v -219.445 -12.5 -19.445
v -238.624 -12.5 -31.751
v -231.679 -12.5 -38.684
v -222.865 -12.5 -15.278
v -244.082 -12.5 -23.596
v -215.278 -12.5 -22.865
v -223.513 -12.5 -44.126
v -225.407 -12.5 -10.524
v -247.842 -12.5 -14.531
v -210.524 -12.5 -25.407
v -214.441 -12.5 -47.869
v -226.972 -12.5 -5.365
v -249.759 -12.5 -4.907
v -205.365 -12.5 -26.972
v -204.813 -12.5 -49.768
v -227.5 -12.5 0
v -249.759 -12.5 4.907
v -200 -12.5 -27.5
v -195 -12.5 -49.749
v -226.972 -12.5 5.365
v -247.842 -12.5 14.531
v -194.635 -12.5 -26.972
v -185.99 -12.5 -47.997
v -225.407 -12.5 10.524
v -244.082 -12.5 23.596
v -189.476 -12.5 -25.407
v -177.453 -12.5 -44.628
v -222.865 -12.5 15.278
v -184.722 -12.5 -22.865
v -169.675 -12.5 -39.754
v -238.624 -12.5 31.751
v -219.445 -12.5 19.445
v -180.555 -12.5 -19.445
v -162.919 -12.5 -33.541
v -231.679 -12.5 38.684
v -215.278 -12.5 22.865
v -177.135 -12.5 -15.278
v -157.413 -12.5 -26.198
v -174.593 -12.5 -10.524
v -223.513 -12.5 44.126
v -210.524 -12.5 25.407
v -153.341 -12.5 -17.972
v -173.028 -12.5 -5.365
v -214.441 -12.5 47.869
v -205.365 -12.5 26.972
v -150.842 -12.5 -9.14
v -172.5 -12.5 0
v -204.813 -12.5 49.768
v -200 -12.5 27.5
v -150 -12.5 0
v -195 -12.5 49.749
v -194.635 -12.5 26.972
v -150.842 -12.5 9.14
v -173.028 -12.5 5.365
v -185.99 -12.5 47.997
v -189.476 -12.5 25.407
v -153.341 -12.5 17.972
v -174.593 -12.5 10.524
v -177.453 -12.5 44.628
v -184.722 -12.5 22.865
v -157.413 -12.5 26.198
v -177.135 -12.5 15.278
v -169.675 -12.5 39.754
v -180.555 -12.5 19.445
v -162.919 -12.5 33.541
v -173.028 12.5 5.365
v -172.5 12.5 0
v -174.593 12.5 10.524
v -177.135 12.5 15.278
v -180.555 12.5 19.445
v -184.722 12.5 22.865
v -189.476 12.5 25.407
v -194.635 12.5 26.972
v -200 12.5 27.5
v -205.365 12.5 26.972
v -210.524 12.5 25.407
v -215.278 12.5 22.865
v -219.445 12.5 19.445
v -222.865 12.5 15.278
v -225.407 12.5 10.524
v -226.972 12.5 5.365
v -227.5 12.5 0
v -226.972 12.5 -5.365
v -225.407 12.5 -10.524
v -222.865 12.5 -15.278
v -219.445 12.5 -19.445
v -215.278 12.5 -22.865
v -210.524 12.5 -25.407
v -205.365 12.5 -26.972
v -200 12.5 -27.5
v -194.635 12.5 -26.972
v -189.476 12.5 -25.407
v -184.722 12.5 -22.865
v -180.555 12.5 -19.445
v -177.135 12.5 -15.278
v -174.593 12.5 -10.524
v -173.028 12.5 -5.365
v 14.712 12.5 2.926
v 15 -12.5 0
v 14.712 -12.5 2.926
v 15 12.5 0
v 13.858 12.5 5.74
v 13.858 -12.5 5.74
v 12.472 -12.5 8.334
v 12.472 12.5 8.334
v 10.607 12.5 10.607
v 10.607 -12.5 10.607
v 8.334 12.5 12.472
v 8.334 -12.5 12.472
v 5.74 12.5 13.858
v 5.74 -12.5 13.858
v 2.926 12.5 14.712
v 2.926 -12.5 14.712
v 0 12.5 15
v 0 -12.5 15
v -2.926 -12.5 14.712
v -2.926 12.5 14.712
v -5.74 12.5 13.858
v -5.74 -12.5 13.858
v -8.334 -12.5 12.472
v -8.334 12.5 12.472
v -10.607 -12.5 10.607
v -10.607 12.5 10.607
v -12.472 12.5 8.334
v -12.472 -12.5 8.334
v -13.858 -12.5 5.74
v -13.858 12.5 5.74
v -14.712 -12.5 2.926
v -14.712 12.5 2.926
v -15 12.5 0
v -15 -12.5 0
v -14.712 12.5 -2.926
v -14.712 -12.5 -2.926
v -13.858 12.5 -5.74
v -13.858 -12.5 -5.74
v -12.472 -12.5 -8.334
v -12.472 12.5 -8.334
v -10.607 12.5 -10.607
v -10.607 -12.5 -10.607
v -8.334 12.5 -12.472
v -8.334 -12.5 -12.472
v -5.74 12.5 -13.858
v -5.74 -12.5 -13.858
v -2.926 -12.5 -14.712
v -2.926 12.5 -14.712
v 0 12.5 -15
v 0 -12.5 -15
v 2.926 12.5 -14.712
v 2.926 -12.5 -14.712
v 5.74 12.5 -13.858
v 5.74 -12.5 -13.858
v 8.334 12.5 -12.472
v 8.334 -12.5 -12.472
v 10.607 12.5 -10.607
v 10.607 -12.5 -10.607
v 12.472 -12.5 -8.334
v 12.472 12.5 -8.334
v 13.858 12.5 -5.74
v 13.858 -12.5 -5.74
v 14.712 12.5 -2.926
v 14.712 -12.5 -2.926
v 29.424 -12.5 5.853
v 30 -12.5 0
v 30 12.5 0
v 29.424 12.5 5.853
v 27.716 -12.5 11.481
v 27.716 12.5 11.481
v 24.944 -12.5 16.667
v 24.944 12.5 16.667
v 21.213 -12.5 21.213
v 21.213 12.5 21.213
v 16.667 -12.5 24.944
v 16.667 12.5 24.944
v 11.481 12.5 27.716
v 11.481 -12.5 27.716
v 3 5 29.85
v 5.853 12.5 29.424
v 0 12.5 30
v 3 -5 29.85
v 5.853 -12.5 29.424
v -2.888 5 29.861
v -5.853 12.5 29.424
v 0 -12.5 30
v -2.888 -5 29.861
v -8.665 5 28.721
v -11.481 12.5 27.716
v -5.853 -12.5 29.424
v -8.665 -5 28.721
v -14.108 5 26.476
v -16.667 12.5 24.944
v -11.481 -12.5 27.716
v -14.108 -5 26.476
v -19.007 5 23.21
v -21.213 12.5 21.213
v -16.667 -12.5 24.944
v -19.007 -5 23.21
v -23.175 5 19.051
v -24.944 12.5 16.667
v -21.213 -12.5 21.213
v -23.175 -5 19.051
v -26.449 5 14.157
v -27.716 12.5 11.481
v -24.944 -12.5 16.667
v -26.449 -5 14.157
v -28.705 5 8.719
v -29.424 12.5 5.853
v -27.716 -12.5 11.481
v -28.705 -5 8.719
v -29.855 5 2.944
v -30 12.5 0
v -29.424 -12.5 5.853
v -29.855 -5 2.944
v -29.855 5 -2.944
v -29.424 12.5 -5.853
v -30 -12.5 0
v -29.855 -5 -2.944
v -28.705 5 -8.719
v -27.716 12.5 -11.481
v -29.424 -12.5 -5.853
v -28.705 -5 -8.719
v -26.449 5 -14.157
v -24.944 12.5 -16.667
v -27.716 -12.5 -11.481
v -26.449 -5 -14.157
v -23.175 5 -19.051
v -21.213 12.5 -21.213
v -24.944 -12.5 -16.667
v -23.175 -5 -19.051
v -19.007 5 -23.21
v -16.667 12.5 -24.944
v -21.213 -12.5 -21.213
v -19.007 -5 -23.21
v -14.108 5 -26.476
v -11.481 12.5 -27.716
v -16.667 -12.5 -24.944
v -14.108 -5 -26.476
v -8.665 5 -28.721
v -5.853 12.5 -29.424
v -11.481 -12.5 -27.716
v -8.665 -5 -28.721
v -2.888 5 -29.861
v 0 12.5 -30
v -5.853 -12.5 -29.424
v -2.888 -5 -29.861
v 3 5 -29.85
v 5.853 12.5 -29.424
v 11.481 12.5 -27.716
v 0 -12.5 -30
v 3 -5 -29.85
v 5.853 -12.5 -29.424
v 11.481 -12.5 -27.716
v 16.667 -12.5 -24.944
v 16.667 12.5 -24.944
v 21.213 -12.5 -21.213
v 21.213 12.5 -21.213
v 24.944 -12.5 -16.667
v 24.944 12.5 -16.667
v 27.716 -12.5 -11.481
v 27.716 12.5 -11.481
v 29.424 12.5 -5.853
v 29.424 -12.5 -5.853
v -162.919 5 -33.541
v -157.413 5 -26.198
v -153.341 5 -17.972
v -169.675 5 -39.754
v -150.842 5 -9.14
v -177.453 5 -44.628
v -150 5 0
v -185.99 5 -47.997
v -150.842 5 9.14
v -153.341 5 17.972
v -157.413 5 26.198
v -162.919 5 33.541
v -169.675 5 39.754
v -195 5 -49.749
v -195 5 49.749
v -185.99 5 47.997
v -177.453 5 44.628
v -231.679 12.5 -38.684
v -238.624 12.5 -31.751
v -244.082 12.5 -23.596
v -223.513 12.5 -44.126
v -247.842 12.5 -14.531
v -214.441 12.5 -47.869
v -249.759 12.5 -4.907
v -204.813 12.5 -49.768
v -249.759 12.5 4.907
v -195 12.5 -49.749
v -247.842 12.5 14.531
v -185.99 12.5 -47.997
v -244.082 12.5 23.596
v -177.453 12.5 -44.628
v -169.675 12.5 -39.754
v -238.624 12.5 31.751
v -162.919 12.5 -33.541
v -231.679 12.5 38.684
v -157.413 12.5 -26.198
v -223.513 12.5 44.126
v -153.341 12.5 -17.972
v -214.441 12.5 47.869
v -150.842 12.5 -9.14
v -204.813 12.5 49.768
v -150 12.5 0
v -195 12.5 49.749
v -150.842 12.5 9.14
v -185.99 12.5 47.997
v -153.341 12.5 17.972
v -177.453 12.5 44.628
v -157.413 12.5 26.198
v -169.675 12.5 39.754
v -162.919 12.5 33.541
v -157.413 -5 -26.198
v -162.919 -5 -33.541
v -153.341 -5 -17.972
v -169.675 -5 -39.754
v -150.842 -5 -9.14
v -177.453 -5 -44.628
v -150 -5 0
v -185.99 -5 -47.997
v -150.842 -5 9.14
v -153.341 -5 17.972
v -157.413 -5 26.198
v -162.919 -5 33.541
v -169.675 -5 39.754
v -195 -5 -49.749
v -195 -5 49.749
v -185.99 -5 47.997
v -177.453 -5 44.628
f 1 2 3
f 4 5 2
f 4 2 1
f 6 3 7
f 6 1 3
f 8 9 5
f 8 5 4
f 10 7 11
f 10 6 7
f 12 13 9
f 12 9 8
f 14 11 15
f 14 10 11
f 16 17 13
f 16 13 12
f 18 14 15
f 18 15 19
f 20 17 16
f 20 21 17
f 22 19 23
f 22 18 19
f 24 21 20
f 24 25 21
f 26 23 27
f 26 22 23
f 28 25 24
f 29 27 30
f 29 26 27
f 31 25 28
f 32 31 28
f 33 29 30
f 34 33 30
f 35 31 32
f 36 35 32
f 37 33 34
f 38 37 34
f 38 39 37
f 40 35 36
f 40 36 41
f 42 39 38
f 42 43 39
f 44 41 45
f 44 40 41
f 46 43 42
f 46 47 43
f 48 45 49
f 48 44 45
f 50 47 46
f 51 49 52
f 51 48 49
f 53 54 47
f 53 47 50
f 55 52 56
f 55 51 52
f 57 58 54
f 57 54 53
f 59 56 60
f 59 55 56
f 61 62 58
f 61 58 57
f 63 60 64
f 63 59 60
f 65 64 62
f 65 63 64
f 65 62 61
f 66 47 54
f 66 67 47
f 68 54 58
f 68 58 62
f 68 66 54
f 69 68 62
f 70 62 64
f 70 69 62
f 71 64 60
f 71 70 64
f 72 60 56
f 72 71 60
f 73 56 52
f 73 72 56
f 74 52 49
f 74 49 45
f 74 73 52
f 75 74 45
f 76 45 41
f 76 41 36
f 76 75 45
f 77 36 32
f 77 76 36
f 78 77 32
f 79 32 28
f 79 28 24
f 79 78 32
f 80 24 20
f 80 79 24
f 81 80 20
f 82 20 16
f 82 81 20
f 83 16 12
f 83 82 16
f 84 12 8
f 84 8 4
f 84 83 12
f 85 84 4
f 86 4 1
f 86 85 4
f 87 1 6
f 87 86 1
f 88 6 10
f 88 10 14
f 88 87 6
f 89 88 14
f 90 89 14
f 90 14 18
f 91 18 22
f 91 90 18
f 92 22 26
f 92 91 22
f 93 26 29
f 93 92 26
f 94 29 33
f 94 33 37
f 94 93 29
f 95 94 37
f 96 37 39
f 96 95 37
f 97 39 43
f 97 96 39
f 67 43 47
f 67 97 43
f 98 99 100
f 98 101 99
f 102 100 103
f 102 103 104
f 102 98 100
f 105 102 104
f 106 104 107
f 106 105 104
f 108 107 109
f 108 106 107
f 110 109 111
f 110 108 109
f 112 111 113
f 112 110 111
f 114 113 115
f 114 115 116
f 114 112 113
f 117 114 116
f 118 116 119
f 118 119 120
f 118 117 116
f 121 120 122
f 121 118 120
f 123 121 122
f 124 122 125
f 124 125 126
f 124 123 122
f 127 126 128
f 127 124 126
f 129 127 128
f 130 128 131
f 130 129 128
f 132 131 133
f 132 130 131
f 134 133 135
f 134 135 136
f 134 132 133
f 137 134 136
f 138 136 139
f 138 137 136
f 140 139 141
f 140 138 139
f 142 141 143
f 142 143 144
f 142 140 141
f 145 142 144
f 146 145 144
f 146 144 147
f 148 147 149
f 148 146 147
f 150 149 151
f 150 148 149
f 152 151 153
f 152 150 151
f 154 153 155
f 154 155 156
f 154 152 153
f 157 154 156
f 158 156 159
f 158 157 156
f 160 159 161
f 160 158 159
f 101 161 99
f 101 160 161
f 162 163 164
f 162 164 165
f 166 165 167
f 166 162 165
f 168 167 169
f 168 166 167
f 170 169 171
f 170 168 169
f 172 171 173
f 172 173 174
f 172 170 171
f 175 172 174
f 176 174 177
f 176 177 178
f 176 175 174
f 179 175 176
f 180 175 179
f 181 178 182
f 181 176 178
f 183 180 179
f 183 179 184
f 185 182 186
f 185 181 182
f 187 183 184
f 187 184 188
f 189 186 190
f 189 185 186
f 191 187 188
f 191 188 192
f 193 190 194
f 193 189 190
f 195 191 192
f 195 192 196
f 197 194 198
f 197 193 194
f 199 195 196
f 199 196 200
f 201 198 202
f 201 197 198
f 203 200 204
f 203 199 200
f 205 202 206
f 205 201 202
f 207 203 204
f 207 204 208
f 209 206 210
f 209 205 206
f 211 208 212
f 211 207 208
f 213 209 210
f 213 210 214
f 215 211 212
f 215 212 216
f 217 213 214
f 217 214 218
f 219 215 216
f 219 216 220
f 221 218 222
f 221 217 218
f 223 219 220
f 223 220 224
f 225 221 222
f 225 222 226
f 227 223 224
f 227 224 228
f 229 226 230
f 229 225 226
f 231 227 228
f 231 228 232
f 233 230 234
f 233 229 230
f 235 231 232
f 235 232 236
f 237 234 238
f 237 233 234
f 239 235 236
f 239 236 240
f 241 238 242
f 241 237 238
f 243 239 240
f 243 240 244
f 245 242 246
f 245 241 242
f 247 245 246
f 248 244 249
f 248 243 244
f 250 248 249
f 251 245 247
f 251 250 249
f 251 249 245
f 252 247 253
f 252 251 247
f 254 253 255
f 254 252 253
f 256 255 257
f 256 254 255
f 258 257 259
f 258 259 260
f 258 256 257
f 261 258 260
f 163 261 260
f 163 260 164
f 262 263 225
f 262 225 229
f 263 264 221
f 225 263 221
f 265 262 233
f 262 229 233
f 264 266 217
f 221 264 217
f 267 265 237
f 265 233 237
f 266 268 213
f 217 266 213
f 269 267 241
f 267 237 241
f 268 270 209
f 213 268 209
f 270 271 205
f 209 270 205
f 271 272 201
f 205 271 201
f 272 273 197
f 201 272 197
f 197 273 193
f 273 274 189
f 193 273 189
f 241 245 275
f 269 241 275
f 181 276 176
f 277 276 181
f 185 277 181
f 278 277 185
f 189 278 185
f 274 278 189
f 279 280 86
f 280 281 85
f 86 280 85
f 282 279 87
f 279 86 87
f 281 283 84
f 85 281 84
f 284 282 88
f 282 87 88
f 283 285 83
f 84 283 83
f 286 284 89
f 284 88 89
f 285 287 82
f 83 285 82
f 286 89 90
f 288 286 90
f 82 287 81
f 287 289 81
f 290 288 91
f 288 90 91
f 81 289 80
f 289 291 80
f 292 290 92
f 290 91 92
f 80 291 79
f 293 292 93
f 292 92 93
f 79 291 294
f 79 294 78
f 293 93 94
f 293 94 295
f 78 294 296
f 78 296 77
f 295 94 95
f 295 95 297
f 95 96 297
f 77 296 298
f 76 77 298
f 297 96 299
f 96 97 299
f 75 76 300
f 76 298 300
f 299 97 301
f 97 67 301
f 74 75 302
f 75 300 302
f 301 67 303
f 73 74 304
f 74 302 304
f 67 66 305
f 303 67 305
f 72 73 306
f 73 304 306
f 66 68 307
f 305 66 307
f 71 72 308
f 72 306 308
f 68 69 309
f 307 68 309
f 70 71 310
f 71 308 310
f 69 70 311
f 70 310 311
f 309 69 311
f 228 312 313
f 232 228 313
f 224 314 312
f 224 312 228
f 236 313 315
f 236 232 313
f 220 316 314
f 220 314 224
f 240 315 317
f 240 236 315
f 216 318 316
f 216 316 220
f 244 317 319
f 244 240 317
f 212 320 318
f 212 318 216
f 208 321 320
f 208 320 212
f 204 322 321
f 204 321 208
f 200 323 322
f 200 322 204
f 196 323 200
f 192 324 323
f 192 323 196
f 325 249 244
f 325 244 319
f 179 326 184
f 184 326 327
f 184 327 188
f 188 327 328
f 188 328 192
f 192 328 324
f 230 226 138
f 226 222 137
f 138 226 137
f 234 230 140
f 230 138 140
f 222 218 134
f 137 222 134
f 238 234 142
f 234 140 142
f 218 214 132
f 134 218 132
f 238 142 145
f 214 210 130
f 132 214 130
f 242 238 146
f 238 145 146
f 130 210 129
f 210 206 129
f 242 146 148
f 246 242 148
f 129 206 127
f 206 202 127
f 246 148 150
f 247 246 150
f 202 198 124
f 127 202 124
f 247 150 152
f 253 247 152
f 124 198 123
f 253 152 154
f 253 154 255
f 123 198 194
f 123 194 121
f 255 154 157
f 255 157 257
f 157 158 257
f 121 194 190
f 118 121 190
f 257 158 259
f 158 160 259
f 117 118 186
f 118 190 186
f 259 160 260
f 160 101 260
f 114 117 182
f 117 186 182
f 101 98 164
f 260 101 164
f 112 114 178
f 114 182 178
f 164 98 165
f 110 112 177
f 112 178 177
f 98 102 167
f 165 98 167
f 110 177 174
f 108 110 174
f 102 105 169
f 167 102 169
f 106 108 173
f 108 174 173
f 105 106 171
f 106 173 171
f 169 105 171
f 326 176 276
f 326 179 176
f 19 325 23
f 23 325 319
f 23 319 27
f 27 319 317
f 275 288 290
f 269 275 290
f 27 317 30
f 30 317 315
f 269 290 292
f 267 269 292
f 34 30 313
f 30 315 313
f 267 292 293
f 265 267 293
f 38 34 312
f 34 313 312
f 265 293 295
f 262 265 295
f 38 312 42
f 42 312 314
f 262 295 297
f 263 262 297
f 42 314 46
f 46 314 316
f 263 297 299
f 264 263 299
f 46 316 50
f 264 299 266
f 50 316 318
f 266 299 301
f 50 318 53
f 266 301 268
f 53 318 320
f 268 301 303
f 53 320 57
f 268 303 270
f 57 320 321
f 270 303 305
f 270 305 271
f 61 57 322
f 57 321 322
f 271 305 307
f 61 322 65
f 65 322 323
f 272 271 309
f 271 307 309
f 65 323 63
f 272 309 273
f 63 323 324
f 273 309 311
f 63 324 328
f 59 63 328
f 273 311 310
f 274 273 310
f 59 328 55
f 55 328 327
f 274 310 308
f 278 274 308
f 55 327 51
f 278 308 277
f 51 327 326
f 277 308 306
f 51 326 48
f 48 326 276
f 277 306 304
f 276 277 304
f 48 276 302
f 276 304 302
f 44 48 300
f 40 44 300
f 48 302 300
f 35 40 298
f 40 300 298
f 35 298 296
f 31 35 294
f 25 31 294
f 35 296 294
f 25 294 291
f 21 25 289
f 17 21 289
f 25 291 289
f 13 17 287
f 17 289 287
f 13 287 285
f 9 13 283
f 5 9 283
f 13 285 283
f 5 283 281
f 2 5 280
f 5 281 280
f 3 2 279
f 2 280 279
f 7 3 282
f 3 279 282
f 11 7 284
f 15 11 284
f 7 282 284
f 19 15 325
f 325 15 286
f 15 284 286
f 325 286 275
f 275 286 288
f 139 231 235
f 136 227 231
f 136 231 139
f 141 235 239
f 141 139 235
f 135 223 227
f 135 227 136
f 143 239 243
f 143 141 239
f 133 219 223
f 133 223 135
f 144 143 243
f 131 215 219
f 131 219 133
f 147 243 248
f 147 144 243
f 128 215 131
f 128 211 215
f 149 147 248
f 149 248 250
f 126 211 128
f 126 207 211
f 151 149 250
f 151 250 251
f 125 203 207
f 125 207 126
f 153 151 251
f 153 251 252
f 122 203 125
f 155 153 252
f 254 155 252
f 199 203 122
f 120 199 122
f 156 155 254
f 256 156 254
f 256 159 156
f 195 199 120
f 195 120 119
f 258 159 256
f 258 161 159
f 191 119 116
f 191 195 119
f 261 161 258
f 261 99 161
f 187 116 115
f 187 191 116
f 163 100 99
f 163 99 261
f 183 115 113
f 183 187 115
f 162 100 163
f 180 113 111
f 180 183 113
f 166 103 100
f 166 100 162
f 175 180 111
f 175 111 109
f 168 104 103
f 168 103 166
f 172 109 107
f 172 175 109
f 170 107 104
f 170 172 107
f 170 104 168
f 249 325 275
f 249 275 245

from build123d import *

# Parameters (mm, degrees)
F1_DEPTH = 5
F0_R     = 27.5
F0_R_2   = 15
F2_DEPTH = 12.5


with BuildPart() as f1:
    # F0 (on Front) → F1 (new body, symmetric)
    with BuildSketch(Plane.XZ):
        with BuildLine():
            ThreePointArc((-195, 49.7493718553), (-162.9190075645, 33.5410196625), (-150, 0))
            ThreePointArc((-150, 0), (-162.9190075645, -33.5410196625), (-195, -49.7493718553))
            Line((-195, -49.7493718553), (3, -29.8496231132))
            ThreePointArc((3, -29.8496231132), (-30, 0), (3, 29.8496231132))
            Line((3, 29.8496231132), (-195, 49.7493718553))
        make_face()
    extrude(amount=F1_DEPTH, both=True)

    # F0 (on Front) → F2 (join, symmetric)
    with BuildSketch(Plane.XZ):
        with BuildLine():
            ThreePointArc((-195, -49.7493718553), (-162.9190075645, -33.5410196625), (-150, 0))
            ThreePointArc((-150, 0), (-162.9190075645, 33.5410196625), (-195, 49.7493718553))
            ThreePointArc((-195, 49.7493718553), (-250, 0), (-195, -49.7493718553))
        make_face()
        with Locations((-200, 0)):
            Circle(F0_R, mode=Mode.SUBTRACT)
        with BuildLine():
            ThreePointArc((30, 0), (22.2485954613, 20.1246117975), (3, 29.8496231132))
            ThreePointArc((3, 29.8496231132), (-30, 0), (3, -29.8496231132))
            ThreePointArc((3, -29.8496231132), (22.2485954613, -20.1246117975), (30, 0))
        make_face()
        Circle(F0_R_2, mode=Mode.SUBTRACT)
    extrude(amount=F2_DEPTH, both=True)


solid = f1.part
